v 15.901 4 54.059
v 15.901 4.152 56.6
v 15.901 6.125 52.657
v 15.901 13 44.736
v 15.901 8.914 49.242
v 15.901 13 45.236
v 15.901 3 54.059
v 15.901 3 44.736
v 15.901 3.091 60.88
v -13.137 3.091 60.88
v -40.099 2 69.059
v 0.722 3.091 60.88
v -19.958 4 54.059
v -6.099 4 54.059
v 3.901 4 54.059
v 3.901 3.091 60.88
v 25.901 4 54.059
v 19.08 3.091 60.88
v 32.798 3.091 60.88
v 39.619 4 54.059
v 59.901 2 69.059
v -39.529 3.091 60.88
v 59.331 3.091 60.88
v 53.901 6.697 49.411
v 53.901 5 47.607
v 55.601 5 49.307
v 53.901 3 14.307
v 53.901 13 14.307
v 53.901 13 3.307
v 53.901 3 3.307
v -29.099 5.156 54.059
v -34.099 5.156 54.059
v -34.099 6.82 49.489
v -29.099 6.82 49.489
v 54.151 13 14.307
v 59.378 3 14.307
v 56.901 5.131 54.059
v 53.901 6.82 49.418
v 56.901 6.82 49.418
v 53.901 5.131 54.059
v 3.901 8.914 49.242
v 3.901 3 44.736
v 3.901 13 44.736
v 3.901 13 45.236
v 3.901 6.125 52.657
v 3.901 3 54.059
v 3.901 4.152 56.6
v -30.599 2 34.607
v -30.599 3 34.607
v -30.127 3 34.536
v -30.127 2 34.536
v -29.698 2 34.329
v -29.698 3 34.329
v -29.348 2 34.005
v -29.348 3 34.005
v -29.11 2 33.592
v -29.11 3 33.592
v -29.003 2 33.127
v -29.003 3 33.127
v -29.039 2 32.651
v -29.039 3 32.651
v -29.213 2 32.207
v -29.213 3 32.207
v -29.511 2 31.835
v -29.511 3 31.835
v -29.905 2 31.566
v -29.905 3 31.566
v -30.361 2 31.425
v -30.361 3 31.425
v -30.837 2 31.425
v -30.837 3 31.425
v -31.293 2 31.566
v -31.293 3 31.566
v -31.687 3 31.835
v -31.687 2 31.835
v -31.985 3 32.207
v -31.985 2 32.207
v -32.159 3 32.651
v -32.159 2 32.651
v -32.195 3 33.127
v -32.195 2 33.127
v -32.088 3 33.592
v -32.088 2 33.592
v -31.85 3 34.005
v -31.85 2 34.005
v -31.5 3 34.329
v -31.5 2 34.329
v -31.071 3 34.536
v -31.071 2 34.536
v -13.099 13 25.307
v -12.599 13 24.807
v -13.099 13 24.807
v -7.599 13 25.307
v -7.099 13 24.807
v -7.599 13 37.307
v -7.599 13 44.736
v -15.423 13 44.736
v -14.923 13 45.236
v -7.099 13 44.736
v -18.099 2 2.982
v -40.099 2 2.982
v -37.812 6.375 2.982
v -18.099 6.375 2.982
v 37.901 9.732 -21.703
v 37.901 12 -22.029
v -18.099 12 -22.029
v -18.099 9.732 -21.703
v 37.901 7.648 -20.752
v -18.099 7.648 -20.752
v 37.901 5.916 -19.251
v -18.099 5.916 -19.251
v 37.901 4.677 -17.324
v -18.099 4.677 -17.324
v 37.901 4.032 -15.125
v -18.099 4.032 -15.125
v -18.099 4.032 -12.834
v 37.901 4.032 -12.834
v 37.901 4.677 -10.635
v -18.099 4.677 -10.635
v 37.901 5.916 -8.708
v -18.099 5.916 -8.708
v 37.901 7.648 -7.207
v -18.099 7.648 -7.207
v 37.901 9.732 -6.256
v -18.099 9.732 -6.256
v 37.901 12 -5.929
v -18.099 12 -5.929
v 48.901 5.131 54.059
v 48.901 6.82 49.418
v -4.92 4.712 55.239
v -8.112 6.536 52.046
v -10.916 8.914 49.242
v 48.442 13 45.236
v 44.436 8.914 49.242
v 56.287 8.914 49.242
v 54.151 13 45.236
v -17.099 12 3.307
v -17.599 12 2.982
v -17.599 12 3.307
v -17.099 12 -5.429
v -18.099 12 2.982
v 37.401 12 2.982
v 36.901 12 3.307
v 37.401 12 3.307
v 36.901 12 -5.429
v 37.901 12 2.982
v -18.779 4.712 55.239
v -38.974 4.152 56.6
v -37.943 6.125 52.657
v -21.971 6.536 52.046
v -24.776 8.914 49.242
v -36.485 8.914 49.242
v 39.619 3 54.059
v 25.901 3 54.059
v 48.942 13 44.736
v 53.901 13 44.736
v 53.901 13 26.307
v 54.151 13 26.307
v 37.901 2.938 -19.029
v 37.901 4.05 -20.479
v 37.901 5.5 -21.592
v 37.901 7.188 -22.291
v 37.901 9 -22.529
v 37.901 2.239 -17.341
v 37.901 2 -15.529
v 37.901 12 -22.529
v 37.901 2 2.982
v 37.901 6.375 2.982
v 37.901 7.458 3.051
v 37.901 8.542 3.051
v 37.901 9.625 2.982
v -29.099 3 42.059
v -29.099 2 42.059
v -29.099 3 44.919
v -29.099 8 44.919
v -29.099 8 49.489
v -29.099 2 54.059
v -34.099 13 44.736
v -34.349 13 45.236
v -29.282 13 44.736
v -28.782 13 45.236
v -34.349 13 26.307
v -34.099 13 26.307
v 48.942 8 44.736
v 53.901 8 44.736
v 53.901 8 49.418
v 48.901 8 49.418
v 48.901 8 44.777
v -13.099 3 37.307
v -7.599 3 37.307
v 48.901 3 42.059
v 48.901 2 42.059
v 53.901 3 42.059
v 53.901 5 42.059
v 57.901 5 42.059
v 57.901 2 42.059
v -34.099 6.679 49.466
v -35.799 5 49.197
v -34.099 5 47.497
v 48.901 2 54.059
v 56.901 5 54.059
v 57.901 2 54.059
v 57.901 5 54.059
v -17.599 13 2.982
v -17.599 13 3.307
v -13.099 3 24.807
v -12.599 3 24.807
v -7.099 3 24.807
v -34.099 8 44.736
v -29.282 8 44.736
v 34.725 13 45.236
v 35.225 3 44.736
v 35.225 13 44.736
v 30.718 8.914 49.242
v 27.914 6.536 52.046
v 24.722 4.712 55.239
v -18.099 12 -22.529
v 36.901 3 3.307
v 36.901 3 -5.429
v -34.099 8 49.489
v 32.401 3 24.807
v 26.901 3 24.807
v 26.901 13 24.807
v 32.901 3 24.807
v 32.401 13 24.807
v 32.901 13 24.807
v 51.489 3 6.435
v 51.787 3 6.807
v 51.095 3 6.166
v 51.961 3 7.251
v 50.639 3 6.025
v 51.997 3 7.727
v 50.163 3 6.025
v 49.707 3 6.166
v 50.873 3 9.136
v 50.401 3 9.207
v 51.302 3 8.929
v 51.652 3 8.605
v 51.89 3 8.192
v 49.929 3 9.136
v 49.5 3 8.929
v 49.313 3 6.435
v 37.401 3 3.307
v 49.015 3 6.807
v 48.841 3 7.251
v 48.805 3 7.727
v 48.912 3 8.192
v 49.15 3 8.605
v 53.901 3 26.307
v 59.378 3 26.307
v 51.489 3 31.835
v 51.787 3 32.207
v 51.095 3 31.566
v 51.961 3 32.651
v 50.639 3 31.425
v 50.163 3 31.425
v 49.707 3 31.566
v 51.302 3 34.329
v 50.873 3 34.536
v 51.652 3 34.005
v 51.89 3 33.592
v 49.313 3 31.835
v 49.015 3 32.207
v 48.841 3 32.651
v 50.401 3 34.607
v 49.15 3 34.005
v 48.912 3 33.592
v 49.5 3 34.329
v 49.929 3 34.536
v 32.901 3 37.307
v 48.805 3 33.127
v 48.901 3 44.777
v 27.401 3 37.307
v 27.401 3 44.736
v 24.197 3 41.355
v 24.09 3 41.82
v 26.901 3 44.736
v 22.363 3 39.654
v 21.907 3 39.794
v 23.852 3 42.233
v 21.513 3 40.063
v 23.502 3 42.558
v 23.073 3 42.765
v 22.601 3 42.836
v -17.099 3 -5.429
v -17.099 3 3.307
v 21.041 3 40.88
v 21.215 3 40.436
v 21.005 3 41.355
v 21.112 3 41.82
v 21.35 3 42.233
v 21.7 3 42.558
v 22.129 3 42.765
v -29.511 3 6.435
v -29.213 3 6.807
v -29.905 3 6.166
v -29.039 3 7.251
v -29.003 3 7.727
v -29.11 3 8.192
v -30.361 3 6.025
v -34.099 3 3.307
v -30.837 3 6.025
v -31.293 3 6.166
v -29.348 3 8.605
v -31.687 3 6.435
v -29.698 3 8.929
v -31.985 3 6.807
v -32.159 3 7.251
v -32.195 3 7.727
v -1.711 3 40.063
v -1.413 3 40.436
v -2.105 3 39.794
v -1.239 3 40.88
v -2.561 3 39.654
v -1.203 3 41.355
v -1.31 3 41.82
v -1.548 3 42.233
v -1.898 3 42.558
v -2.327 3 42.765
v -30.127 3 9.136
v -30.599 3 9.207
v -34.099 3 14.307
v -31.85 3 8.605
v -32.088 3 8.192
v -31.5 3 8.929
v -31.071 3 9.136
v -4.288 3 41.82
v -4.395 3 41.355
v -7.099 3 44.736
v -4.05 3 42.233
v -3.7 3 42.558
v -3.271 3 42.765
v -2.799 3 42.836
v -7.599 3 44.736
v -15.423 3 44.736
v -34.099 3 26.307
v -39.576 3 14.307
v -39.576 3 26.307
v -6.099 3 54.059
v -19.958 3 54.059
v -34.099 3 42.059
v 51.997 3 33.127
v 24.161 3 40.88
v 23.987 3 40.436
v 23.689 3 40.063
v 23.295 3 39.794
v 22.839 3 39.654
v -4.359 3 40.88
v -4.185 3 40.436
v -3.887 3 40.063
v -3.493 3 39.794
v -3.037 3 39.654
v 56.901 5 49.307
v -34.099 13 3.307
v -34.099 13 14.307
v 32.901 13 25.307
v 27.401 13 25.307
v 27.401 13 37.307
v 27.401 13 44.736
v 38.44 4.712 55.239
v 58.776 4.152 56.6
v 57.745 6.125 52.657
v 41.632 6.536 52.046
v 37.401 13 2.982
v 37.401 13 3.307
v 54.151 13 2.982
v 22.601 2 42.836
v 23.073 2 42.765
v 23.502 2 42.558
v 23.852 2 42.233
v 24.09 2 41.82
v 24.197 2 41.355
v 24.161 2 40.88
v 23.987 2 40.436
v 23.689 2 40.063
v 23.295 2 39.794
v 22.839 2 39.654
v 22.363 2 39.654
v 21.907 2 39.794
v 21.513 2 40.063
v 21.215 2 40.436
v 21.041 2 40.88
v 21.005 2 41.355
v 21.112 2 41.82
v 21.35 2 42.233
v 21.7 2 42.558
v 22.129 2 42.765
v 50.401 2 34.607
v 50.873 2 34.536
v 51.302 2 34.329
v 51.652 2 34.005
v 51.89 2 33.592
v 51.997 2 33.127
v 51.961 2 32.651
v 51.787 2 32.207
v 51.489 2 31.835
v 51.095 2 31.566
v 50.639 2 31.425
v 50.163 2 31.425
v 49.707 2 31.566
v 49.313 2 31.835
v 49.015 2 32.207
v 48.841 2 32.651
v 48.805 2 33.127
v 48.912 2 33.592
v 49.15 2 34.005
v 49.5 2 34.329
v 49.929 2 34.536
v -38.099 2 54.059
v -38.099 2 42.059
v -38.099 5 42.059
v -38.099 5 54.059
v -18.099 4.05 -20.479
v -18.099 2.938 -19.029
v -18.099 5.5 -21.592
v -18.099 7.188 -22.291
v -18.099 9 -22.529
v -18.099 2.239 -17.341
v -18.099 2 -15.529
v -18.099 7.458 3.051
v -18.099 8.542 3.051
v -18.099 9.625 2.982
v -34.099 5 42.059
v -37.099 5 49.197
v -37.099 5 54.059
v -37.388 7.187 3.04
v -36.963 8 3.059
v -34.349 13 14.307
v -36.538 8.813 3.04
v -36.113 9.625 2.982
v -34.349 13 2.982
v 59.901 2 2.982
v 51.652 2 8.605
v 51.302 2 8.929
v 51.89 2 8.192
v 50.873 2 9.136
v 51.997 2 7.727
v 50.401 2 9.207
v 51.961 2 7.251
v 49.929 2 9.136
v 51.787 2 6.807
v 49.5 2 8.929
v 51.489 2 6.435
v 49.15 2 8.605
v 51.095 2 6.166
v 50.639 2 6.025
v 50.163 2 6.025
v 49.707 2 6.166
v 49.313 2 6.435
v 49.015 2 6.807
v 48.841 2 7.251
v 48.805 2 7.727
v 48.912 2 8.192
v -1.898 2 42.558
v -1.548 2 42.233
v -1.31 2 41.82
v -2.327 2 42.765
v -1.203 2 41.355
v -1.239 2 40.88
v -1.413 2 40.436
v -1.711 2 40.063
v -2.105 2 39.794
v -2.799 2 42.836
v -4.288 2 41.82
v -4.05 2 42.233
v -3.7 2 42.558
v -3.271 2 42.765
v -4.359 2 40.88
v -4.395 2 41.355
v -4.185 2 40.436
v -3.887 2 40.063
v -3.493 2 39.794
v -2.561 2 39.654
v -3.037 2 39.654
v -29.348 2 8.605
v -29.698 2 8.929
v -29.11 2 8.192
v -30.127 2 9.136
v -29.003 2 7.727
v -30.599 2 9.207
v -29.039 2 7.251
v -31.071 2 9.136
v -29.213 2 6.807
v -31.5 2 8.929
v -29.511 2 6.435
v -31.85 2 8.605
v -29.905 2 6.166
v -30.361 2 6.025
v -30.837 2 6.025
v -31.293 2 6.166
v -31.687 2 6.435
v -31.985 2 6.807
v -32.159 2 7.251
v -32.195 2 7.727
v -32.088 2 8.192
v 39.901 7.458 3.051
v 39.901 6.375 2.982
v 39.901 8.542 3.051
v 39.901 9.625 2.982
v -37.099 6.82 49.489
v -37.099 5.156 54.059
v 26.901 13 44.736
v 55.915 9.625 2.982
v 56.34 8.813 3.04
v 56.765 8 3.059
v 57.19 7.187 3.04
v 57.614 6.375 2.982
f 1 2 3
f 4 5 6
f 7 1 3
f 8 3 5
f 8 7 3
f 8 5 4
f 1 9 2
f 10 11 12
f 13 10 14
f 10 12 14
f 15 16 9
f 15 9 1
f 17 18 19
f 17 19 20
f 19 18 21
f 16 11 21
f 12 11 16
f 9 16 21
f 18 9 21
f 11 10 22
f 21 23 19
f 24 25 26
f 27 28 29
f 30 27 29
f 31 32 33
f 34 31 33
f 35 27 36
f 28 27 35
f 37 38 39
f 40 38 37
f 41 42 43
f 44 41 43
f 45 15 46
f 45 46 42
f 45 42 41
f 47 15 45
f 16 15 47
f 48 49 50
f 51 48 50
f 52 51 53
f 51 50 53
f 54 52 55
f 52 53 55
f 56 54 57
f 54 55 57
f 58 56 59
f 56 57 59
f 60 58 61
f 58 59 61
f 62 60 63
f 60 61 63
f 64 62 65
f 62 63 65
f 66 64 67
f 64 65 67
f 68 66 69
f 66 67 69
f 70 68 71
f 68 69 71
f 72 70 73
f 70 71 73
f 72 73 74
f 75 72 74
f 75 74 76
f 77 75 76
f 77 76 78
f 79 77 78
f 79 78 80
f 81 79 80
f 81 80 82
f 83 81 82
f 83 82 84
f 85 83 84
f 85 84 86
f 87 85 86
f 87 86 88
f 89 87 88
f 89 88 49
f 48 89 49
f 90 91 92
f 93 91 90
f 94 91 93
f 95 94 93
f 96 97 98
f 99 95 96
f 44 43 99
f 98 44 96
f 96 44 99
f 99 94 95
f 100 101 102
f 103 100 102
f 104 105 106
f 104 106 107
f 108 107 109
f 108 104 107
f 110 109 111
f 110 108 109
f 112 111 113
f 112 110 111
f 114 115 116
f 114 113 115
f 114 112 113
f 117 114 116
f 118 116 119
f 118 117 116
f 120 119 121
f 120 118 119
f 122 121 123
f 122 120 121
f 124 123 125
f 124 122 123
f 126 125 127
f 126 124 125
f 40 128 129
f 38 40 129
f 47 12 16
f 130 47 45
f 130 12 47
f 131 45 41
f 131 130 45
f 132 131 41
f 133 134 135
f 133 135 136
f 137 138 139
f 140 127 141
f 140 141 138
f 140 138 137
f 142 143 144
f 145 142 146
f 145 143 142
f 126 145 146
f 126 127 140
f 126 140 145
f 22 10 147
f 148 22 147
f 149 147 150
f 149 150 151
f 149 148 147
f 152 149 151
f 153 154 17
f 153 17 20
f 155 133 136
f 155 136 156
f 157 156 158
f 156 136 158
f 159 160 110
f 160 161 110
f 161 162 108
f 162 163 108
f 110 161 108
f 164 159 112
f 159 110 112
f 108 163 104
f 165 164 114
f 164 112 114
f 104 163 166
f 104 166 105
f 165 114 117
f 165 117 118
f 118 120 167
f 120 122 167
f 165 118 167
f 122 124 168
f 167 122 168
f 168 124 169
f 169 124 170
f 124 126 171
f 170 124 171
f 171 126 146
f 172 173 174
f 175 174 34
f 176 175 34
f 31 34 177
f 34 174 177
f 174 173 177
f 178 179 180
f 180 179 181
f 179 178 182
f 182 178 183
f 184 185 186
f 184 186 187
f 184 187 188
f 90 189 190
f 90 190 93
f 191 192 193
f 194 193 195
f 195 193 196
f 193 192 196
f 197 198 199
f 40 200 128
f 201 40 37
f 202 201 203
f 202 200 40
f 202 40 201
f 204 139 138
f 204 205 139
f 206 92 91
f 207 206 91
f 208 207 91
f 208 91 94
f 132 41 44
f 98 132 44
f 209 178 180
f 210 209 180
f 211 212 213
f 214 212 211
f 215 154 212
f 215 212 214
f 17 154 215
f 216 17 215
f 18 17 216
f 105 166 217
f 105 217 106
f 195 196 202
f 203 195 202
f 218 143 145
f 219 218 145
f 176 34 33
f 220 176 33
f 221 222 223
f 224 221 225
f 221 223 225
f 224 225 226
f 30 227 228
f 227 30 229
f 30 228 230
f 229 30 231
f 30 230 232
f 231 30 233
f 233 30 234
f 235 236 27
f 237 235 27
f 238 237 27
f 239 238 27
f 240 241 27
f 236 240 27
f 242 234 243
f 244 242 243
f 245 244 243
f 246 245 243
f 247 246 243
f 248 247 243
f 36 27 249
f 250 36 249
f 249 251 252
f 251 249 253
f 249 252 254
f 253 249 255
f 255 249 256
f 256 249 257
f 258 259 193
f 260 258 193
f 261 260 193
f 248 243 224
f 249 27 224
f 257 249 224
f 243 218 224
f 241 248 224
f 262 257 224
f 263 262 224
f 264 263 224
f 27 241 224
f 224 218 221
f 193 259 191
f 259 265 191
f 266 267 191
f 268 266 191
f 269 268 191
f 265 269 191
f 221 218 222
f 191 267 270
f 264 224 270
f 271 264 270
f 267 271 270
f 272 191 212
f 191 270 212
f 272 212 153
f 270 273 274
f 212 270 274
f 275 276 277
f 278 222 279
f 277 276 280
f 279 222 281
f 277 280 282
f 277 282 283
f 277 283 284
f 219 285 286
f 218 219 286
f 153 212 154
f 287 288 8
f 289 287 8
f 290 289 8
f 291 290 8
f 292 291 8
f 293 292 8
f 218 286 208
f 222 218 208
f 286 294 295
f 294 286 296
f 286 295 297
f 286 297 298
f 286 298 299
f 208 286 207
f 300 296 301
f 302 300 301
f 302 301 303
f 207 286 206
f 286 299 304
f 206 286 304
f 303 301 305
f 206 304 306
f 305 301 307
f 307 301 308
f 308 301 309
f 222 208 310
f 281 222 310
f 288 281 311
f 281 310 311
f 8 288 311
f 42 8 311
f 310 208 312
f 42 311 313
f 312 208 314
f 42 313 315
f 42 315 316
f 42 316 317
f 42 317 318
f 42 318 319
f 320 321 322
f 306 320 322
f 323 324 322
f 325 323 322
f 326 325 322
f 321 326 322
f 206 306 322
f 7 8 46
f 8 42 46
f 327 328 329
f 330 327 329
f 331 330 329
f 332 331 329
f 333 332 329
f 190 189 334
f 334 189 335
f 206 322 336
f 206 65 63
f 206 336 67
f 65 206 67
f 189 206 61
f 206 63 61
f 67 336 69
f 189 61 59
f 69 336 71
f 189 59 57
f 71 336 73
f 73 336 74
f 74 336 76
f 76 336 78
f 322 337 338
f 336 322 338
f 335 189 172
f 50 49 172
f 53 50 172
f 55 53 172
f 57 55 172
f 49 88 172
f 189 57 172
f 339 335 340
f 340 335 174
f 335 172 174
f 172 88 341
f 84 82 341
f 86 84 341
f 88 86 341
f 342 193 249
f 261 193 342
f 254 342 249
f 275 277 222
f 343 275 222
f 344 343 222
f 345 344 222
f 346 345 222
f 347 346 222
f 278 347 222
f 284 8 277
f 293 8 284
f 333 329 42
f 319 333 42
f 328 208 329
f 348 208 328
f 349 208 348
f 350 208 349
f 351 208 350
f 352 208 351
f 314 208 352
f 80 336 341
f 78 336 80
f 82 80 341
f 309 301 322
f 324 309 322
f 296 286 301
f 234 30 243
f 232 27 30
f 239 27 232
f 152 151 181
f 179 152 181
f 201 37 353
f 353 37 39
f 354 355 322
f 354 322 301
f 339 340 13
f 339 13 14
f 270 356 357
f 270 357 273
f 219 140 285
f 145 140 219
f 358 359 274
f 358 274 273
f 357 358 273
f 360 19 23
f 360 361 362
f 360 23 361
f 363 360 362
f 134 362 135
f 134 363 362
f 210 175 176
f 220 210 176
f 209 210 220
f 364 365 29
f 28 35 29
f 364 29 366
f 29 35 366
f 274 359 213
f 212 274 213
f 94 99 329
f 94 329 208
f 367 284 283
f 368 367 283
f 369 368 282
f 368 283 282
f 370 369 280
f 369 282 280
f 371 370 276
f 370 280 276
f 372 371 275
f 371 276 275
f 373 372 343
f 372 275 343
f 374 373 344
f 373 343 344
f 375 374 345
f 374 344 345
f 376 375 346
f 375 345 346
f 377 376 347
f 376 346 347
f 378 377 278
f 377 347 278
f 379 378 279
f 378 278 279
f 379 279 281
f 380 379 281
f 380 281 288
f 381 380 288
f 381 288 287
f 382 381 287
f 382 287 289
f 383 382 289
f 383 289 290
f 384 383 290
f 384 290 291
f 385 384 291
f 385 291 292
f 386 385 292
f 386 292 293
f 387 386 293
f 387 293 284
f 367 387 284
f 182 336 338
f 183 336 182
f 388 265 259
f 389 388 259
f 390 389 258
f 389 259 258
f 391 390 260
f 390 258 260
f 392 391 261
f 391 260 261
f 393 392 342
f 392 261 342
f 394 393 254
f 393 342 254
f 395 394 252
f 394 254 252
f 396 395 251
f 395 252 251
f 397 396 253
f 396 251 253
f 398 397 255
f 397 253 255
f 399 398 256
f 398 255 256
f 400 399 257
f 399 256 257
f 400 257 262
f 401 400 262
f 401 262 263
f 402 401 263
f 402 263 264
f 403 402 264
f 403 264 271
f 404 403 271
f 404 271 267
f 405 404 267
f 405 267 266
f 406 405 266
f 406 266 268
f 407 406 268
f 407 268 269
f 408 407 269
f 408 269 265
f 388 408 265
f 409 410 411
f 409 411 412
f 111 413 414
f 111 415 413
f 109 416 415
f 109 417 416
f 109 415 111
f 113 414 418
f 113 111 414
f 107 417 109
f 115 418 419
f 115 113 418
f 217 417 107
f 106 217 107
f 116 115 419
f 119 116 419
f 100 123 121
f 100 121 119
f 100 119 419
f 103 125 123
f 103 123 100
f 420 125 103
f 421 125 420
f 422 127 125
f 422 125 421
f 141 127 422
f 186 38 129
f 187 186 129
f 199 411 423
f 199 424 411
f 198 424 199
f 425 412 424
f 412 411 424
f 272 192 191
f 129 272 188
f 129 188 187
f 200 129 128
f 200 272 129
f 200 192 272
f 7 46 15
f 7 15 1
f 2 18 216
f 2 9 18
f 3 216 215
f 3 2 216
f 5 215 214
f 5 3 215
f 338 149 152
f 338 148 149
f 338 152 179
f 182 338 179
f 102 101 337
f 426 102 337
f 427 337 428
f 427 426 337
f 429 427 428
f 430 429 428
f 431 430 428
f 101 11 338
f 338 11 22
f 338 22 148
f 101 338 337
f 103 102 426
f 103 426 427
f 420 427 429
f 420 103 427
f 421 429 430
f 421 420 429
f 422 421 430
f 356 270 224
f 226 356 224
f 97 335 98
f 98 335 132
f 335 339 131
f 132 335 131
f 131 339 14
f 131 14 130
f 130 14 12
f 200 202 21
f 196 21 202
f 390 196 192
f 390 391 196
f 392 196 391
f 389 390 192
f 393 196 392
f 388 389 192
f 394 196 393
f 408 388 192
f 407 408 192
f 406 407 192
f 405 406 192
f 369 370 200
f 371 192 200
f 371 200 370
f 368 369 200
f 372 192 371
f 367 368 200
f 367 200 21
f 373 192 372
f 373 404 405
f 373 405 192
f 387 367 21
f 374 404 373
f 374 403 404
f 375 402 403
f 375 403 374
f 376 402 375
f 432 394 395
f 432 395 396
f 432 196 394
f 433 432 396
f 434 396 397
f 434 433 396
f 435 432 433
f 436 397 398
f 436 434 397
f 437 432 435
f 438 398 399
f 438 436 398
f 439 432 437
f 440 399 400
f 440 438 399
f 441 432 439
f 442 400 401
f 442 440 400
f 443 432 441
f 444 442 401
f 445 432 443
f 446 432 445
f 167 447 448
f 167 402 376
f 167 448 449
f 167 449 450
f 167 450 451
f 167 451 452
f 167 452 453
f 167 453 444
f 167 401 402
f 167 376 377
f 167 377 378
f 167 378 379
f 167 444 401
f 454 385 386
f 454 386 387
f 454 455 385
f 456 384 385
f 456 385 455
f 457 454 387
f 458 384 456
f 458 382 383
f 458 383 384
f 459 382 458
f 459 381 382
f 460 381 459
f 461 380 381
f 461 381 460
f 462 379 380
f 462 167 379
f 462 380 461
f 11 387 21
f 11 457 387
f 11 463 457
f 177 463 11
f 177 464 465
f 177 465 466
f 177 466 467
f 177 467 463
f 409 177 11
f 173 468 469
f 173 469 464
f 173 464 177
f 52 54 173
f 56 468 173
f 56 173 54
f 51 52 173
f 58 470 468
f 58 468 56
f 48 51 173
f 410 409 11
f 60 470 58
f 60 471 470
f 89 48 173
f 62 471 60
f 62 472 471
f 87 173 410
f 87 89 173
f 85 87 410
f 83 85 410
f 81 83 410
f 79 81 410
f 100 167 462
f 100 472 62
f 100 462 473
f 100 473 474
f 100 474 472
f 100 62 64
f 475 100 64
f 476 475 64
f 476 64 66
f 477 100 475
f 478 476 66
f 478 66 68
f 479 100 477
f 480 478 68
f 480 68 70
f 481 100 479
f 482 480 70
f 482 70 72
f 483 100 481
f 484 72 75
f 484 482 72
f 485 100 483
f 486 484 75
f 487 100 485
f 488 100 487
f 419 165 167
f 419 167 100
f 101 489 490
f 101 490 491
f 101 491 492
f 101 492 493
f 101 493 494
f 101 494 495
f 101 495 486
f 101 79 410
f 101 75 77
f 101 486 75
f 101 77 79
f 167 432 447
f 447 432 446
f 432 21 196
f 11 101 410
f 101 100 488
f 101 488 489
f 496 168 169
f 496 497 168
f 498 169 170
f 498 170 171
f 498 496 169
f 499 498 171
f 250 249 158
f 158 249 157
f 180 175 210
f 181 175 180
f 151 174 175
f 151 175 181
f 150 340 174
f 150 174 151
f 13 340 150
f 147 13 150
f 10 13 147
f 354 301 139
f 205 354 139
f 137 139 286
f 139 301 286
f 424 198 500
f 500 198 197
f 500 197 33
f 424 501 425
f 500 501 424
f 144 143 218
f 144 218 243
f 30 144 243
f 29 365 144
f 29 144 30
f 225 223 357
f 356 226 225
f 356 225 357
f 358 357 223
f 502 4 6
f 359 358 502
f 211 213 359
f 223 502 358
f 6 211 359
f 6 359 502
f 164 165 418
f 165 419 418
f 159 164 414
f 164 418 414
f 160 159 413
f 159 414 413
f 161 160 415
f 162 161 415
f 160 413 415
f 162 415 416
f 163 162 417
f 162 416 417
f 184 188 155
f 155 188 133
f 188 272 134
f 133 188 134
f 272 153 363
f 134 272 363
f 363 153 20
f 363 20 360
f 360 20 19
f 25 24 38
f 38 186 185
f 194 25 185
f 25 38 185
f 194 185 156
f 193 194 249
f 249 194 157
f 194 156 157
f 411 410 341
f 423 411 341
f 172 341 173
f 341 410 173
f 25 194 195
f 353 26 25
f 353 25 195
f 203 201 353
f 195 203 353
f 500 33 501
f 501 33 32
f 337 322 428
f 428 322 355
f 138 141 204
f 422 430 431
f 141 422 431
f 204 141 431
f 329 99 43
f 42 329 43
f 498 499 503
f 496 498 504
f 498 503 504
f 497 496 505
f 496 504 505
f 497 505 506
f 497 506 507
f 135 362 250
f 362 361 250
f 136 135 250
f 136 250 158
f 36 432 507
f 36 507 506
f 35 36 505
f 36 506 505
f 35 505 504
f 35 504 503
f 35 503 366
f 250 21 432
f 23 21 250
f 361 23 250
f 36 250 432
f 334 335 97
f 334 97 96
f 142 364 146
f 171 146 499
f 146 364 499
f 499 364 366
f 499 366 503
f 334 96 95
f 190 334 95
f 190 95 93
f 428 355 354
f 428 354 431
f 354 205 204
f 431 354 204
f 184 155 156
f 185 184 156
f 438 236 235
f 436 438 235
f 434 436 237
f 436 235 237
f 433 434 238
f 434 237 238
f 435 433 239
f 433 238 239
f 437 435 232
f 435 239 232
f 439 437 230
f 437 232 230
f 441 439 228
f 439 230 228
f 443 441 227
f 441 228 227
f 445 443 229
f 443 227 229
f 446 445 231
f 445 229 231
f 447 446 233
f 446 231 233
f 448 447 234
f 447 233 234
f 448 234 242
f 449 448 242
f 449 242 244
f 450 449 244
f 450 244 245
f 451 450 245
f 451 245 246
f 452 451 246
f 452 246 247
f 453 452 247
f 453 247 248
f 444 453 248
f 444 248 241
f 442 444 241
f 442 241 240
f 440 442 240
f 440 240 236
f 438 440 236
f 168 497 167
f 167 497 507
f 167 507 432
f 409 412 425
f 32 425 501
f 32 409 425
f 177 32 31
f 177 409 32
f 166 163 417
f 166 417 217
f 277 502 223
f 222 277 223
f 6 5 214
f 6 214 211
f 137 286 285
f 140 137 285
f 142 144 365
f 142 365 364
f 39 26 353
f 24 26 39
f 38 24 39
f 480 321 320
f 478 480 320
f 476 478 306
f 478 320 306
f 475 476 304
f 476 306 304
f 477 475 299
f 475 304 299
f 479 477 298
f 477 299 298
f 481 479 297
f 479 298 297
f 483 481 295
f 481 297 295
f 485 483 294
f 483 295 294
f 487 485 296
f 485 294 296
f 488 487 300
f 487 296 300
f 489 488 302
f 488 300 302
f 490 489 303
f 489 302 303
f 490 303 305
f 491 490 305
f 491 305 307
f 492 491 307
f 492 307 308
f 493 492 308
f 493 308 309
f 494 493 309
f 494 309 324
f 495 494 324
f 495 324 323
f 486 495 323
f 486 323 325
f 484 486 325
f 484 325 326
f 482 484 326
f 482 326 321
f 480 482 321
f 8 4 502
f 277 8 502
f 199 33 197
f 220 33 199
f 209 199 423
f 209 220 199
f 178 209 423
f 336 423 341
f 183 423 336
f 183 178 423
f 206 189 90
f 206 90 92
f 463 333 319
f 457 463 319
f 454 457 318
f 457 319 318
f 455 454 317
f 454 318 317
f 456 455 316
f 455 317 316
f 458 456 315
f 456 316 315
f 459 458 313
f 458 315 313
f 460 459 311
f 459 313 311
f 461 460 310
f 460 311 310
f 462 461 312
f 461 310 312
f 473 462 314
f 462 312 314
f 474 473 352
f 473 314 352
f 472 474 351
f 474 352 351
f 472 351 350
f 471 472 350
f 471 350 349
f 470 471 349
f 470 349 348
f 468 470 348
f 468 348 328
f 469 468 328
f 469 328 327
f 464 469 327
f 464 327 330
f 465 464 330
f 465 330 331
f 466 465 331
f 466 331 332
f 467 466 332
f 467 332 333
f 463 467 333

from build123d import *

# Parameters (mm, degrees)
SKETCH1_W             = 100
SKETCH1_H             = 95
BOSS_EXTRUDE2_DEPTH   = 20
CUT_EXTRUDE2_DEPTH    = 20
CUT_EXTRUDE3_START    = -22
CUT_EXTRUDE3_DEPTH    = 22
CUT_EXTRUDE4_DEPTH    = 2
SKETCH7_W             = 12
SKETCH7_H             = 10
CUT_EXTRUDE5_DEPTH    = 60
BOSS_EXTRUDE3_DEPTH   = 60
BOSS_EXTRUDE3_2_DEPTH = 60
SKETCH9_W             = 9.8
SKETCH9_H             = 15.2
CUT_EXTRUDE6_DEPTH    = 40
SKETCH10_W            = 9.7
SKETCH10_H            = 15.2
CUT_EXTRUDE7_DEPTH    = 40
SKETCH11_W            = 12
SKETCH11_H            = 10
CUT_EXTRUDE8_DEPTH    = 100
SKETCH12_W            = 39.436597342
SKETCH12_H            = 19.718298671
CUT_EXTRUDE9_DEPTH    = 100
CUT_EXTRUDE11_DEPTH   = 100
BOSS_EXTRUDE4_START   = -100
BOSS_EXTRUDE4_DEPTH   = 100
CUT_EXTRUDE12_REACH   = 95.581
SKETCH16_W            = 118.541652127
SKETCH16_H            = 71.876381232
SKETCH17_W            = 118.826271758
SKETCH17_H            = 93.94417767
CUT_EXTRUDE13_DEPTH   = 10
SKETCH18_R            = 8.1
CUT_EXTRUDE14_DEPTH   = 100
SKETCH19_W            = 45
SKETCH19_H            = 22.574653526
CUT_EXTRUDE16_DEPTH   = 10
SKETCH23_W            = 100
SKETCH23_H            = 16.30510129
BOSS_EXTRUDE6_DEPTH   = 10
SKETCH24_W            = 34
SKETCH24_H            = 21
CUT_EXTRUDE17_DEPTH   = 10
SKETCH25_W            = 45
SKETCH25_H            = 9.359456604
CUT_EXTRUDE18_DEPTH   = 10
SKETCH26_W            = 21
SKETCH26_H            = 34
CUT_EXTRUDE19_DEPTH   = 10
CUT_EXTRUDE20_DEPTH   = 22
CUT_EXTRUDE21_DEPTH   = 22
SKETCH29_W            = 15.251923191
SKETCH29_H            = 7.428393779
CUT_EXTRUDE22_DEPTH   = 10
CUT_EXTRUDE23_DEPTH   = 5.5
CUT_EXTRUDE24_DEPTH   = 5.5
BOSS_EXTRUDE9_DEPTH   = 100
SKETCH44_W            = 96.870466172
SKETCH44_H            = 84.683658551
CUT_EXTRUDE37_DEPTH   = 9.8
SKETCH45_W            = 7.532932596
SKETCH45_H            = 10
CUT_EXTRUDE38_DEPTH   = 100
SKETCH46_W            = 12
SKETCH46_H            = 85.376414904
CUT_EXTRUDE39_DEPTH   = 100
SKETCH47_W            = 144.570000294
SKETCH47_H            = 119.898222903
CUT_EXTRUDE40_DEPTH   = 2
CUT_EXTRUDE41_DEPTH   = 100
SKETCH49_W            = 33.934396209
SKETCH49_H            = 51.308285461
CUT_EXTRUDE44_DEPTH   = 9.7
SKETCH51_W            = 12
SKETCH51_H            = 7.5
BOSS_EXTRUDE13_DEPTH  = 2
CUT_EXTRUDE47_DEPTH   = 100
FILLET6_R             = 20
CUT_EXTRUDE48_DEPTH   = 100
SKETCH56_W            = 55
SKETCH56_H            = 18.976681206
CUT_EXTRUDE49_DEPTH   = 10
SKETCH57_W            = 12.959426316
SKETCH57_H            = 7.428393779
SKETCH57_W_2          = 11.011417888
CUT_EXTRUDE50_DEPTH   = 10
SKETCH58_W            = 33.922191822
SKETCH58_H            = 11
BOSS_EXTRUDE14_DEPTH  = 56
CUT_EXTRUDE52_DEPTH   = 100
SKETCH60_W            = 54.5
SKETCH60_H            = 8.411095911
CUT_EXTRUDE54_DEPTH   = 9
SKETCH62_W            = 9
SKETCH62_H            = 12
CUT_EXTRUDE55_DEPTH   = 3
SKETCH63_W            = 5
SKETCH63_H            = 7.358935777
SKETCH63_H_2          = 7.429646455
CUT_EXTRUDE56_DEPTH   = 3
CHAMFER1_SIZE         = 5
CHAMFER1_SIZE_2       = 1.819851171
CUT_EXTRUDE57_DEPTH   = 3
CUT_EXTRUDE58_DEPTH   = 3
CHAMFER3_START        = 4.100125042
CHAMFER3_DEPTH        = 0.925236243
SKETCH67_W            = 12
SKETCH67_H            = 10
CUT_EXTRUDE59_DEPTH   = 20
SKETCH68_W            = 12
SKETCH68_H            = 10
CUT_EXTRUDE60_DEPTH   = 20
SKETCH69_W            = 0.5
SKETCH69_H            = 0.325884987
BOSS_EXTRUDE15_DEPTH  = 9
SKETCH70_W            = 0.5
SKETCH70_H            = 8.736980898
BOSS_EXTRUDE16_DEPTH  = 9
SKETCH71_W            = 45
SKETCH71_H            = 1.571606221
CUT_EXTRUDE61_DEPTH   = 10
SKETCH72_W            = 47.768265836
SKETCH72_H            = 12.037959142
CUT_EXTRUDE62_DEPTH   = 10
CHAMFER4_START        = 4.610133616
CHAMFER4_DEPTH        = 1.951310752
FILLET10_R            = 7
SKETCH73_R            = 1.6
CUT_EXTRUDE63_DEPTH   = 20


with BuildPart() as part:
    # Sketch1 → Boss-Extrude2 (new body)
    with BuildSketch(Plane(origin=(0, 0, 0), x_dir=(1, 0, 0), z_dir=(0, 1, 0))):
        with Locations((9.900990099, -16.559405941)):
            Rectangle(SKETCH1_W, SKETCH1_H)
    extrude(amount=BOSS_EXTRUDE2_DEPTH)

    # Sketch2 → Cut-Extrude2 (cut)
    with BuildSketch(Plane(origin=(59.900990099, 0, 0), x_dir=(0, 0, -1), z_dir=(1, 0, 0))):
        with BuildLine():
            Line((-1.059405941, 0), (28.940594059, 0))
            Line((28.940594059, 0), (30.940594059, 0))
            Line((30.940594059, 0), (30.940594059, 20))
            Line((30.940594059, 20), (25.982188638, 20))
            Line((25.982188638, 20), (1.898999481, 20))
            ThreePointArc((1.898999481, 20), (-2.876419925, 10.487577267), (-1.059405941, 0))
        make_face()
    extrude(amount=-CUT_EXTRUDE2_DEPTH, mode=Mode.SUBTRACT)

    # Sketch3 → Cut-Extrude3 (cut)
    with BuildSketch(Plane.ZY.offset(40.099009901).offset(CUT_EXTRUDE3_START)):
        with BuildLine():
            Line((-1.898999481, 20), (-30.940594059, 20))
            Line((-30.940594059, 20), (-30.940594059, 0))
            Line((-30.940594059, 0), (1.059405941, 0))
            ThreePointArc((1.059405941, 0), (2.876419925, 10.487577267), (-1.898999481, 20))
        make_face()
    extrude(amount=CUT_EXTRUDE3_DEPTH, mode=Mode.SUBTRACT)

    # Sketch5 → Cut-Extrude4 (cut)
    with BuildSketch(Plane(origin=(39.900990099, 0, 0), x_dir=(0, 0, -1), z_dir=(1, 0, 0))):
        with BuildLine():
            Line((19.633434706, 24.018475751), (30.940594059, 20))
            Line((30.940594059, 20), (30.940594059, 0))
            Line((30.940594059, 0), (21.215348762, -7.364828148))
            ThreePointArc((21.215348762, -7.364828148), (-3.037850309, 7.144180617), (19.633434706, 24.018475751))
        make_face()
    extrude(amount=-CUT_EXTRUDE4_DEPTH, mode=Mode.SUBTRACT)

    # Sketch7 → Cut-Extrude5 (cut)
    with BuildSketch(Plane.XY.offset(64.059405941)):
        with Locations((9.900990099, 8)):
            Rectangle(SKETCH7_W, SKETCH7_H)
    extrude(amount=-CUT_EXTRUDE5_DEPTH, mode=Mode.SUBTRACT)

    # Sketch9 → Cut-Extrude6 (cut)
    with BuildSketch(Plane(origin=(33.98019802, 0, 33.98019802), x_dir=(0.7071067811865472, 0, -0.7071067811865479), z_dir=(0.7071067811865479, 0, 0.7071067811865472))):
        with Locations((-47.438423787, 10.6)):
            Rectangle(SKETCH9_W, SKETCH9_H)
    extrude(amount=-CUT_EXTRUDE6_DEPTH, mode=Mode.SUBTRACT)

    # Sketch10 → Cut-Extrude7 (cut)
    with BuildSketch(Plane(origin=(-24.079207921, 0, 24.079207921), x_dir=(0.7071067811865496, 0, 0.7071067811865456), z_dir=(-0.7071067811865456, 0, 0.7071067811865496))):
        with Locations((61.390538266, 10.6)):
            Rectangle(SKETCH10_W, SKETCH10_H)
    extrude(amount=-CUT_EXTRUDE7_DEPTH, mode=Mode.SUBTRACT)

    # Sketch11 → Cut-Extrude8 (cut)
    with BuildSketch(Plane(origin=(59.900990099, 0, 0), x_dir=(0, 0, -1), z_dir=(1, 0, 0))):
        with Locations((-19.876419925, 8)):
            Rectangle(SKETCH11_W, SKETCH11_H)
    extrude(amount=-CUT_EXTRUDE8_DEPTH, mode=Mode.SUBTRACT)

    # Sketch13 → Cut-Extrude11 (cut)
    with BuildSketch(Plane(origin=(59.900990099, 0, 0), x_dir=(0, 0, -1), z_dir=(1, 0, 0))):
        Polygon((-64.059405941, 0), (-54.059405941, 3), (-39.059405941, 20), (-64.059405941, 20), align=None)
    extrude(amount=-CUT_EXTRUDE11_DEPTH, mode=Mode.SUBTRACT)

    # Sketch15 → Boss-Extrude4 (add)
    with BuildSketch(Plane(origin=(59.900990099, 0, 0), x_dir=(0, 0, -1), z_dir=(1, 0, 0)).offset(BOSS_EXTRUDE4_START)):
        Polygon((-64.059405941, 0), (-69.059405941, 0), (-54.059405941, 3), align=None)
    extrude(amount=BOSS_EXTRUDE4_DEPTH)

    # Cut-Extrude12: up to this face of the body (flat: up to its plane)
    cut_extrude12_end = Plane(part.part.faces().sort_by_distance((9.900990099, 13, 21.397301034))[0])
    # Sketch16 → Cut-Extrude12 (cut, up to the picked face)
    with BuildSketch(Plane(origin=(0, 20, 0), x_dir=(1, 0, 0), z_dir=(0, 1, 0)), mode=Mode.PRIVATE) as cut_extrude12_sk1:
        with Locations((7.676480363, -3.191236494)):
            Rectangle(SKETCH16_W, SKETCH16_H)
    cut_extrude12_tool1 = split(extrude(cut_extrude12_sk1.sketch, amount=-CUT_EXTRUDE12_REACH, mode=Mode.PRIVATE), bisect_by=cut_extrude12_end, keep=Keep.BOTH, mode=Mode.PRIVATE)
    add(cut_extrude12_tool1.solids().sort_by(Axis((7.67648, 20, 3.191236), (0, -1, 0)))[0], mode=Mode.SUBTRACT)

    # Sketch17 → Cut-Extrude13 (cut)
    with BuildSketch(Plane(origin=(0, 13, 0), x_dir=(1, 0, 0), z_dir=(0, 1, 0))):
        with Locations((8.099723254, -37.149102118)):
            Rectangle(SKETCH17_W, SKETCH17_H)
    extrude(amount=CUT_EXTRUDE13_DEPTH, mode=Mode.SUBTRACT)

    # Sketch18 → Cut-Extrude14 (cut)
    with BuildSketch(Plane(origin=(37.900990099, 0, 0), x_dir=(0, 0, -1), z_dir=(1, 0, 0))):
        with Locations((14.018402237, 11)):
            Circle(SKETCH18_R)
    extrude(amount=-CUT_EXTRUDE14_DEPTH, mode=Mode.SUBTRACT)

    # Sketch19 → Cut-Extrude16 (cut)
    with BuildSketch(Plane(origin=(0, 13, 0), x_dir=(1, 0, 0), z_dir=(0, 1, 0))):
        with Locations((9.900990099, -7.118128307)):
            Rectangle(SKETCH19_W, SKETCH19_H)
    extrude(amount=-CUT_EXTRUDE16_DEPTH, mode=Mode.SUBTRACT)

    # Sketch23 → Boss-Extrude6 (add)
    with BuildSketch(Plane(origin=(0, 13, 0), x_dir=(1, 0, 0), z_dir=(0, 1, 0))):
        with Locations((9.900990099, -22.02897057)):
            Rectangle(SKETCH23_W, SKETCH23_H)
    extrude(amount=-BOSS_EXTRUDE6_DEPTH)

    # Sketch24 → Cut-Extrude17 (cut)
    with BuildSketch(Plane(origin=(0, 13, 0), x_dir=(1, 0, 0), z_dir=(0, 1, 0))):
        with Locations((9.900990099, -34.235876529)):
            Rectangle(SKETCH24_W, SKETCH24_H)
    extrude(amount=-CUT_EXTRUDE17_DEPTH, mode=Mode.SUBTRACT)

    # Sketch25 → Cut-Extrude18 (cut)
    with BuildSketch(Plane(origin=(0, 13, 0), x_dir=(1, 0, 0), z_dir=(0, 1, 0))):
        with Locations((9.900990099, -18.556148227)):
            Rectangle(SKETCH25_W, SKETCH25_H)
    extrude(amount=-CUT_EXTRUDE18_DEPTH, mode=Mode.SUBTRACT)

    # Sketch26 → Cut-Extrude19 (cut)
    with BuildSketch(Plane(origin=(0, 13, 0), x_dir=(1, 0, 0), z_dir=(0, 1, 0))):
        with Locations((-23.599009901, -20.30748275)):
            Rectangle(SKETCH26_W, SKETCH26_H)
        with Locations((43.400990099, -20.30748275)):
            Rectangle(SKETCH26_W, SKETCH26_H)
    extrude(amount=-CUT_EXTRUDE19_DEPTH, mode=Mode.SUBTRACT)

    # Sketch27 → Cut-Extrude20 (cut)
    with BuildSketch(Plane(origin=(59.900990099, 0, 0), x_dir=(0, 0, -1), z_dir=(1, 0, 0))):
        Polygon((-2.981597763, 6.375369602), (-2.981597763, 22.818607258), (10.704836096, 22.818607258), (10.704836096, 6.375369602), (11.352266392, 6.375369602), (11.352266392, -11.387239174), (-2.981597763, -11.387239174), align=None)
    extrude(amount=-CUT_EXTRUDE20_DEPTH, mode=Mode.SUBTRACT)

    # Sketch28 → Cut-Extrude21 (cut)
    with BuildSketch(Plane.ZY.offset(40.099009901)):
        Polygon((-10.420850948, 6.375369602), (-11.33614904, 6.375369602), (-11.33614904, 34.716091764), (2.981597763, 34.716091764), (2.981597763, 6.375369602), (2.981597763, -16.376944967), (-10.420850948, -16.376944967), align=None)
    extrude(amount=-CUT_EXTRUDE21_DEPTH, mode=Mode.SUBTRACT)

    # Sketch29 → Cut-Extrude22 (cut)
    with BuildSketch(Plane(origin=(0, 13, 0), x_dir=(1, 0, 0), z_dir=(0, 1, 0))):
        with Locations((-15.224971497, -41.02167964)):
            Rectangle(SKETCH29_W, SKETCH29_H)
        with Locations((35.026951694, -41.02167964)):
            Rectangle(SKETCH29_W, SKETCH29_H)
    extrude(amount=-CUT_EXTRUDE22_DEPTH, mode=Mode.SUBTRACT)

    # Sketch30 → Cut-Extrude23 (cut)
    with BuildSketch(Plane.ZY.offset(13.099009901)):
        Polygon((37.30748275, 3), (25.30748275, 13), (37.30748275, 13), align=None)
    extrude(amount=-CUT_EXTRUDE23_DEPTH, mode=Mode.SUBTRACT)

    # Sketch31 → Cut-Extrude24 (cut)
    with BuildSketch(Plane(origin=(32.900990099, 0, 0), x_dir=(0, 0, -1), z_dir=(1, 0, 0))):
        Polygon((-37.30748275, 3), (-37.30748275, 13), (-25.30748275, 13), align=None)
    extrude(amount=-CUT_EXTRUDE24_DEPTH, mode=Mode.SUBTRACT)

    # Sketch43 → Boss-Extrude9 (add)
    with BuildSketch(Plane(origin=(59.900990099, 0, 0), x_dir=(0, 0, -1), z_dir=(1, 0, 0))):
        Polygon((-69.059405941, 0), (-54.059405941, 3), (-45.235876529, 13), (-69.059405941, 13), align=None)
    extrude(amount=-BOSS_EXTRUDE9_DEPTH)

    # Sketch44 → Cut-Extrude37 (cut)
    with BuildSketch(Plane(origin=(-37.008854376, 0, 37.008854376), x_dir=(-0.7071067811865479, 0, -0.7071067811865472), z_dir=(0.7071067811865472, 0, -0.7071067811865479))):
        with Locations((-56.490489978, 45.341829276)):
            Rectangle(SKETCH44_W, SKETCH44_H)
    extrude(amount=CUT_EXTRUDE37_DEPTH, mode=Mode.SUBTRACT)

    # Sketch45 → Cut-Extrude38 (cut)
    with BuildSketch(Plane(origin=(4.205063327, 0, -4.205063327), x_dir=(0.7071067811865488, 0, 0.7071067811865464), z_dir=(-0.7071067811865464, 0, 0.7071067811865488))):
        with Locations((62.474071968, 8)):
            Rectangle(SKETCH45_W, SKETCH45_H)
    extrude(amount=CUT_EXTRUDE38_DEPTH, mode=Mode.SUBTRACT)

    # Sketch46 → Cut-Extrude39 (cut)
    with BuildSketch(Plane(origin=(0, 3, 0), x_dir=(1, 0, 0), z_dir=(0, 1, 0))):
        with Locations((9.900990099, -87.424083981)):
            Rectangle(SKETCH46_W, SKETCH46_H)
    extrude(amount=CUT_EXTRUDE39_DEPTH, mode=Mode.SUBTRACT)

    # Sketch47 → Cut-Extrude40 (cut)
    with BuildSketch(Plane(origin=(0, 0, 0), x_dir=(-1, 0, 0), z_dir=(0, -1, 0))):
        with Locations((-24.404405804, -23.651470154)):
            Rectangle(SKETCH47_W, SKETCH47_H)
    extrude(amount=-CUT_EXTRUDE40_DEPTH, mode=Mode.SUBTRACT)

    # Sketch48 → Cut-Extrude41 (cut)
    with BuildSketch(Plane(origin=(59.900990099, 0, 0), x_dir=(0, 0, -1), z_dir=(1, 0, 0))):
        Polygon((-69.059405941, 2), (-54.059405941, 4), (-45.235876529, 13), (-69.059405941, 13), align=None)
    extrude(amount=-CUT_EXTRUDE41_DEPTH, mode=Mode.SUBTRACT)

    # Sketch49 → Cut-Extrude44 (cut)
    with BuildSketch(Plane(origin=(39.98019802, 0, 39.98019802), x_dir=(0.7071067811865457, 0, -0.7071067811865495), z_dir=(0.7071067811865495, 0, 0.7071067811865457))):
        with Locations((-23.692743151, 28.654142731)):
            Rectangle(SKETCH49_W, SKETCH49_H)
    extrude(amount=CUT_EXTRUDE44_DEPTH, mode=Mode.SUBTRACT)


with BuildPart() as body_2:
    # Sketch8 → Boss-Extrude3 (new body)
    with BuildSketch(Plane(origin=(0, 20, 0), x_dir=(1, 0, 0), z_dir=(0, 1, 0))):
        Polygon((15.900990099, -64.059405941), (19.900990099, -68.059405941), (19.900990099, -64.059405941), align=None)
    extrude(amount=BOSS_EXTRUDE3_DEPTH)


with BuildPart() as body_3:
    # Sketch8 → Boss-Extrude3 2 (new body)
    with BuildSketch(Plane(origin=(0, 20, 0), x_dir=(1, 0, 0), z_dir=(0, 1, 0))):
        Polygon((3.900990099, -64.059405941), (-0.099009901, -68.059405941), (-0.099009901, -64.059405941), align=None)
    extrude(amount=BOSS_EXTRUDE3_2_DEPTH)


with BuildPart() as cut_extrude9_tool:
    # Sketch12 → Cut-Extrude9 (new body)
    with BuildSketch(Plane(origin=(0, 20, 0), x_dir=(1, 0, 0), z_dir=(0, 1, 0))):
        with Locations((5.957330365, -62.235437498)):
            Rectangle(SKETCH12_W, SKETCH12_H)
    extrude(amount=CUT_EXTRUDE9_DEPTH)


with BuildPart() as body_2_1:
    add(body_2.part)

    # Cut-Extrude9: cut by cut_extrude9_tool
    add(cut_extrude9_tool.part, mode=Mode.SUBTRACT)


with BuildPart() as body_3_1:
    add(body_3.part)

    # Cut-Extrude9: cut by cut_extrude9_tool
    add(cut_extrude9_tool.part, mode=Mode.SUBTRACT)


with BuildPart() as body_2_2:
    # of the pieces the cut leaves, the one that is kept (cut_extrude44_keep)
    add(part.part.solids().sort_by_distance((37.900990099, 2, -30.940594059))[0])

    # Sketch51 → Boss-Extrude13 (add)
    with BuildSketch(Plane(origin=(0, 3, 0), x_dir=(1, 0, 0), z_dir=(0, 1, 0))):
        with Locations((9.900990099, -57.809405941)):
            Rectangle(SKETCH51_W, SKETCH51_H)
        Polygon((1.400990099, -61.559405941), (-12.458302812, -61.559405941), (-19.958302812, -54.059405941), (-6.099009901, -54.059405941), align=None)
        Polygon((18.400990099, -61.559405941), (25.900990099, -54.059405941), (39.618861654, -54.059405941), (32.118861654, -61.559405941), align=None)
    extrude(amount=BOSS_EXTRUDE13_DEPTH)

    # Sketch54 → Cut-Extrude47 (cut)
    with BuildSketch(Plane(origin=(59.900990099, 0, 0), x_dir=(0, 0, -1), z_dir=(1, 0, 0))):
        Polygon((-69.059405941, 2), (-54.059405941, 4), (-46.862984026, 11.340350353), (-64.590291843, 12.008025107), align=None)
    extrude(amount=-CUT_EXTRUDE47_DEPTH, mode=Mode.SUBTRACT)

    # Fillet6
    fillet6_edges = [body_2_2.edges().sort_by_distance(p)[0] for p in [
        (-1.099009901, 4, 54.059405941),
        (-30.028656357, 4, 54.059405941),
        (49.759925877, 4, 54.059405941),
        (20.900990099, 4, 54.059405941),
    ]]
    fillet(fillet6_edges, radius=FILLET6_R)

    # Sketch55 → Cut-Extrude48 (cut)
    with BuildSketch(Plane(origin=(0, 0, 2.981597763), x_dir=(-1, 0, 0), z_dir=(0, 0, -1))):
        Polygon((-59.900990099, 2), (-54.150990099, 13), (-59.900990099, 13), align=None)
        Polygon((40.099009901, 2), (34.349009901, 13), (40.099009901, 13), align=None)
    extrude(amount=-CUT_EXTRUDE48_DEPTH, mode=Mode.SUBTRACT)

    # Sketch56 → Cut-Extrude49 (cut)
    with BuildSketch(Plane(origin=(0, 13, 0), x_dir=(1, 0, 0), z_dir=(0, 1, 0))):
        with Locations((9.900990099, -3.819142147)):
            Rectangle(SKETCH56_W, SKETCH56_H)
    extrude(amount=-CUT_EXTRUDE49_DEPTH, mode=Mode.SUBTRACT)

    # Sketch57 → Cut-Extrude50 (cut)
    with BuildSketch(Plane(origin=(0, 13, 0), x_dir=(1, 0, 0), z_dir=(0, 1, 0))):
        with Locations((-27.619296743, -41.02167964)):
            Rectangle(SKETCH57_W, SKETCH57_H)
        with Locations((48.395281155, -41.02167964)):
            Rectangle(SKETCH57_W_2, SKETCH57_H)
    extrude(amount=-CUT_EXTRUDE50_DEPTH, mode=Mode.SUBTRACT)

    # Sketch58 → Boss-Extrude14 (add)
    with BuildSketch(Plane(origin=(37.900990099, 0, 0), x_dir=(0, 0, -1), z_dir=(1, 0, 0))):
        with Locations((13.979498148, 7.5)):
            Rectangle(SKETCH58_W, SKETCH58_H)
    extrude(amount=-BOSS_EXTRUDE14_DEPTH)

    # Sketch59 → Cut-Extrude52 (cut)
    with BuildSketch(Plane(origin=(37.900990099, 0, 0), x_dir=(0, 0, -1), z_dir=(1, 0, 0))):
        with BuildLine():
            Line((5.929498148, 12), (-2.981597763, 12))
            Line((-2.981597763, 12), (-2.981597763, 13))
            Line((-2.981597763, 13), (10.800103806, 21.572693884))
            Line((10.800103806, 21.572693884), (31.372864154, 18.661867154))
            Line((31.372864154, 18.661867154), (30.940594059, 2))
            Line((30.940594059, 2), (22.529498148, 2))
            Line((22.529498148, 2), (22.529498148, 12))
            Line((22.529498148, 12), (22.029498148, 12))
            ThreePointArc((22.029498148, 12), (13.979498148, 3.95), (5.929498148, 12))
        make_face()
    extrude(amount=-CUT_EXTRUDE52_DEPTH, mode=Mode.SUBTRACT)

    # Sketch60 → Cut-Extrude54 (cut)
    with BuildSketch(Plane(origin=(0, 12, 0), x_dir=(1, 0, 0), z_dir=(0, 1, 0))):
        with Locations((9.650990099, 1.223950193)):
            Rectangle(SKETCH60_W, SKETCH60_H)
    extrude(amount=-CUT_EXTRUDE54_DEPTH, mode=Mode.SUBTRACT)

    # Sketch62 → Cut-Extrude55 (cut)
    with BuildSketch(Plane.XZ.offset(-2)):
        with Locations((53.400990099, 48.059405941)):
            Rectangle(SKETCH62_W, SKETCH62_H)
        with Locations((-33.599009901, 48.059405941)):
            Rectangle(SKETCH62_W, SKETCH62_H)
    extrude(amount=-CUT_EXTRUDE55_DEPTH, mode=Mode.SUBTRACT)

    # Sketch63 → Cut-Extrude56 (cut)
    with BuildSketch(Plane(origin=(0, 5, 0), x_dir=(-1, 0, 0), z_dir=(0, -1, 0))):
        with Locations((-51.400990099, -45.73887383)):
            Rectangle(SKETCH63_W, SKETCH63_H)
        with Locations((31.599009901, -45.774229168)):
            Rectangle(SKETCH63_W, SKETCH63_H_2)
    extrude(amount=-CUT_EXTRUDE56_DEPTH, mode=Mode.SUBTRACT)

    # Chamfer1
    # the kernel refuses this chamfer: 5, 1.819851171 mm, written as the material it takes off along each edge
    with BuildSketch(Plane(origin=(48.900990099, 5, 49.418341718), x_dir=(0, 0, 1), z_dir=(1, 0, 0))) as chamfer1_piece_1_section:
        Polygon((CHAMFER1_SIZE, 0), (0, -CHAMFER1_SIZE_2), (0, 0), align=None)
    chamfer1_piece_1 = extrude(amount=5, mode=Mode.PRIVATE)
    chamfer1_piece_1 = split(chamfer1_piece_1, bisect_by=Plane(origin=(48.900990099, 5, 54.059405941), z_dir=(0, 0, -1)), keep=Keep.TOP, mode=Mode.PRIVATE)
    add(chamfer1_piece_1, mode=Mode.SUBTRACT)
    with BuildSketch(Plane(origin=(-29.099009901, 5, 49.489052396), x_dir=(0, 0, 1), z_dir=(-1, 0, 0))) as chamfer1_piece_2_section:
        Polygon((CHAMFER1_SIZE, 0), (0, CHAMFER1_SIZE_2), (0, 0), align=None)
    chamfer1_piece_2 = extrude(amount=5, mode=Mode.PRIVATE)
    chamfer1_piece_2 = split(chamfer1_piece_2, bisect_by=Plane(origin=(-29.099009901, 5, 54.059405941), z_dir=(0, 0, -1)), keep=Keep.TOP, mode=Mode.PRIVATE)
    add(chamfer1_piece_2, mode=Mode.SUBTRACT)

    # Sketch65 → Cut-Extrude57 (cut)
    with BuildSketch(Plane.ZY.offset(-53.900990099)):
        Polygon((49.418341718, 6.819851171), (54.059405941, 5.130641939), (54.059405941, 5), (49.307446654, 5), align=None)
    extrude(amount=-CUT_EXTRUDE57_DEPTH, mode=Mode.SUBTRACT)

    # Sketch66 → Cut-Extrude58 (cut)
    with BuildSketch(Plane(origin=(-34.099009901, 0, 0), x_dir=(0, 0, -1), z_dir=(1, 0, 0))):
        Polygon((-49.489052396, 6.819851171), (-54.059405941, 5.156378521), (-54.059405941, 5), (-49.197438646, 5), align=None)
    extrude(amount=-CUT_EXTRUDE58_DEPTH, mode=Mode.SUBTRACT)

    # Chamfer3: read off the stored shape, not the designer's step
    # Chamfer3 outline → Chamfer3 (cut)
    with BuildSketch(Plane(origin=(0, 0, 0), x_dir=(0.8389187913531886, 0.41417570363718603, -0.3530916991818797), z_dir=(0.5442566136617039, -0.6384116829844108, 0.5442566136617057)).offset(CHAMFER3_START)):
        Polygon((-43.306372973, 41.976414042), (-45.332790806, 40.682725223), (-43.306372973, 39.389036403), align=None)
    extrude(amount=CHAMFER3_DEPTH, mode=Mode.SUBTRACT)

    # Sketch67 → Cut-Extrude59 (cut)
    with BuildSketch(Plane(origin=(-34.099009901, 0, 0), x_dir=(0, 0, -1), z_dir=(1, 0, 0))):
        with Locations((-20.30748275, 8)):
            Rectangle(SKETCH67_W, SKETCH67_H)
    extrude(amount=-CUT_EXTRUDE59_DEPTH, mode=Mode.SUBTRACT)

    # Sketch68 → Cut-Extrude60 (cut)
    with BuildSketch(Plane.ZY.offset(-53.900990099)):
        with Locations((20.30748275, 8)):
            Rectangle(SKETCH68_W, SKETCH68_H)
    extrude(amount=-CUT_EXTRUDE60_DEPTH, mode=Mode.SUBTRACT)

    # Sketch69 → Boss-Extrude15 (add)
    with BuildSketch(Plane(origin=(0, 12, 0), x_dir=(1, 0, 0), z_dir=(0, 1, 0))):
        with Locations((37.150990099, -3.144540257)):
            Rectangle(SKETCH69_W, SKETCH69_H)
    extrude(amount=-BOSS_EXTRUDE15_DEPTH)

    # Sketch70 → Boss-Extrude16 (add)
    with BuildSketch(Plane(origin=(0, 3, 0), x_dir=(1, 0, 0), z_dir=(0, 1, 0))):
        with Locations((-17.349009901, 1.061007699)):
            Rectangle(SKETCH70_W, SKETCH70_H)
    extrude(amount=BOSS_EXTRUDE16_DEPTH)

    # Sketch71 → Cut-Extrude61 (cut)
    with BuildSketch(Plane(origin=(0, 13, 0), x_dir=(1, 0, 0), z_dir=(0, 1, 0))):
        with Locations((9.900990099, -24.02167964)):
            Rectangle(SKETCH71_W, SKETCH71_H)
    extrude(amount=-CUT_EXTRUDE61_DEPTH, mode=Mode.SUBTRACT)

    # Sketch72 → Cut-Extrude62 (cut)
    with BuildSketch(Plane(origin=(0, 13, 0), x_dir=(1, 0, 0), z_dir=(0, 1, 0))):
        with Locations((10.785123017, -18.788503179)):
            Rectangle(SKETCH72_W, SKETCH72_H)
    extrude(amount=-CUT_EXTRUDE62_DEPTH, mode=Mode.SUBTRACT)

    # Chamfer4: read off the stored shape, not the designer's step
    # Chamfer4 outline → Chamfer4 (cut)
    with BuildSketch(Plane(origin=(0, 0, 0), x_dir=(0.8249016374005966, -0.41168718087087774, 0.3873641100055655), z_dir=(0.5652762940490381, 0.6007706906735452, -0.5652762940490402)).offset(CHAMFER4_START)):
        Polygon((60.845995289, -38.098530362), (60.845995289, -40.574729045), (62.906847059, -39.336629703), align=None)
    extrude(amount=CHAMFER4_DEPTH, mode=Mode.SUBTRACT)

    # Fillet10
    fillet10_edges = [body_2_2.edges().sort_by_distance(p)[0] for p in [
        (9.900990099, 2, -22.529498148),
    ]]
    fillet(fillet10_edges, radius=FILLET10_R)

    # Sketch73 → Cut-Extrude63 (cut)
    with BuildSketch(Plane(origin=(0, 3, 0), x_dir=(1, 0, 0), z_dir=(0, 1, 0))):
        with Locations(Location((-30.599009901, -7.60748275, 0), (0, 0, 270))):
            Circle(SKETCH73_R)
        with Locations(Location((-30.599009901, -33.00748275, 0), (0, 0, 270))):
            Circle(SKETCH73_R)
        with Locations(Location((50.400990099, -7.60748275, 0), (0, 0, 270))):
            Circle(SKETCH73_R)
        with Locations(Location((50.400990099, -33.00748275, 0), (0, 0, 270))):
            Circle(SKETCH73_R)
        with Locations(Location((-2.799009901, -41.235876529, 0), (0, 0, 270))):
            Circle(SKETCH73_R)
        with Locations(Location((22.600990099, -41.235876529, 0), (0, 0, 270))):
            Circle(SKETCH73_R)
    extrude(amount=-CUT_EXTRUDE63_DEPTH, mode=Mode.SUBTRACT)


solid = body_2_2.part
